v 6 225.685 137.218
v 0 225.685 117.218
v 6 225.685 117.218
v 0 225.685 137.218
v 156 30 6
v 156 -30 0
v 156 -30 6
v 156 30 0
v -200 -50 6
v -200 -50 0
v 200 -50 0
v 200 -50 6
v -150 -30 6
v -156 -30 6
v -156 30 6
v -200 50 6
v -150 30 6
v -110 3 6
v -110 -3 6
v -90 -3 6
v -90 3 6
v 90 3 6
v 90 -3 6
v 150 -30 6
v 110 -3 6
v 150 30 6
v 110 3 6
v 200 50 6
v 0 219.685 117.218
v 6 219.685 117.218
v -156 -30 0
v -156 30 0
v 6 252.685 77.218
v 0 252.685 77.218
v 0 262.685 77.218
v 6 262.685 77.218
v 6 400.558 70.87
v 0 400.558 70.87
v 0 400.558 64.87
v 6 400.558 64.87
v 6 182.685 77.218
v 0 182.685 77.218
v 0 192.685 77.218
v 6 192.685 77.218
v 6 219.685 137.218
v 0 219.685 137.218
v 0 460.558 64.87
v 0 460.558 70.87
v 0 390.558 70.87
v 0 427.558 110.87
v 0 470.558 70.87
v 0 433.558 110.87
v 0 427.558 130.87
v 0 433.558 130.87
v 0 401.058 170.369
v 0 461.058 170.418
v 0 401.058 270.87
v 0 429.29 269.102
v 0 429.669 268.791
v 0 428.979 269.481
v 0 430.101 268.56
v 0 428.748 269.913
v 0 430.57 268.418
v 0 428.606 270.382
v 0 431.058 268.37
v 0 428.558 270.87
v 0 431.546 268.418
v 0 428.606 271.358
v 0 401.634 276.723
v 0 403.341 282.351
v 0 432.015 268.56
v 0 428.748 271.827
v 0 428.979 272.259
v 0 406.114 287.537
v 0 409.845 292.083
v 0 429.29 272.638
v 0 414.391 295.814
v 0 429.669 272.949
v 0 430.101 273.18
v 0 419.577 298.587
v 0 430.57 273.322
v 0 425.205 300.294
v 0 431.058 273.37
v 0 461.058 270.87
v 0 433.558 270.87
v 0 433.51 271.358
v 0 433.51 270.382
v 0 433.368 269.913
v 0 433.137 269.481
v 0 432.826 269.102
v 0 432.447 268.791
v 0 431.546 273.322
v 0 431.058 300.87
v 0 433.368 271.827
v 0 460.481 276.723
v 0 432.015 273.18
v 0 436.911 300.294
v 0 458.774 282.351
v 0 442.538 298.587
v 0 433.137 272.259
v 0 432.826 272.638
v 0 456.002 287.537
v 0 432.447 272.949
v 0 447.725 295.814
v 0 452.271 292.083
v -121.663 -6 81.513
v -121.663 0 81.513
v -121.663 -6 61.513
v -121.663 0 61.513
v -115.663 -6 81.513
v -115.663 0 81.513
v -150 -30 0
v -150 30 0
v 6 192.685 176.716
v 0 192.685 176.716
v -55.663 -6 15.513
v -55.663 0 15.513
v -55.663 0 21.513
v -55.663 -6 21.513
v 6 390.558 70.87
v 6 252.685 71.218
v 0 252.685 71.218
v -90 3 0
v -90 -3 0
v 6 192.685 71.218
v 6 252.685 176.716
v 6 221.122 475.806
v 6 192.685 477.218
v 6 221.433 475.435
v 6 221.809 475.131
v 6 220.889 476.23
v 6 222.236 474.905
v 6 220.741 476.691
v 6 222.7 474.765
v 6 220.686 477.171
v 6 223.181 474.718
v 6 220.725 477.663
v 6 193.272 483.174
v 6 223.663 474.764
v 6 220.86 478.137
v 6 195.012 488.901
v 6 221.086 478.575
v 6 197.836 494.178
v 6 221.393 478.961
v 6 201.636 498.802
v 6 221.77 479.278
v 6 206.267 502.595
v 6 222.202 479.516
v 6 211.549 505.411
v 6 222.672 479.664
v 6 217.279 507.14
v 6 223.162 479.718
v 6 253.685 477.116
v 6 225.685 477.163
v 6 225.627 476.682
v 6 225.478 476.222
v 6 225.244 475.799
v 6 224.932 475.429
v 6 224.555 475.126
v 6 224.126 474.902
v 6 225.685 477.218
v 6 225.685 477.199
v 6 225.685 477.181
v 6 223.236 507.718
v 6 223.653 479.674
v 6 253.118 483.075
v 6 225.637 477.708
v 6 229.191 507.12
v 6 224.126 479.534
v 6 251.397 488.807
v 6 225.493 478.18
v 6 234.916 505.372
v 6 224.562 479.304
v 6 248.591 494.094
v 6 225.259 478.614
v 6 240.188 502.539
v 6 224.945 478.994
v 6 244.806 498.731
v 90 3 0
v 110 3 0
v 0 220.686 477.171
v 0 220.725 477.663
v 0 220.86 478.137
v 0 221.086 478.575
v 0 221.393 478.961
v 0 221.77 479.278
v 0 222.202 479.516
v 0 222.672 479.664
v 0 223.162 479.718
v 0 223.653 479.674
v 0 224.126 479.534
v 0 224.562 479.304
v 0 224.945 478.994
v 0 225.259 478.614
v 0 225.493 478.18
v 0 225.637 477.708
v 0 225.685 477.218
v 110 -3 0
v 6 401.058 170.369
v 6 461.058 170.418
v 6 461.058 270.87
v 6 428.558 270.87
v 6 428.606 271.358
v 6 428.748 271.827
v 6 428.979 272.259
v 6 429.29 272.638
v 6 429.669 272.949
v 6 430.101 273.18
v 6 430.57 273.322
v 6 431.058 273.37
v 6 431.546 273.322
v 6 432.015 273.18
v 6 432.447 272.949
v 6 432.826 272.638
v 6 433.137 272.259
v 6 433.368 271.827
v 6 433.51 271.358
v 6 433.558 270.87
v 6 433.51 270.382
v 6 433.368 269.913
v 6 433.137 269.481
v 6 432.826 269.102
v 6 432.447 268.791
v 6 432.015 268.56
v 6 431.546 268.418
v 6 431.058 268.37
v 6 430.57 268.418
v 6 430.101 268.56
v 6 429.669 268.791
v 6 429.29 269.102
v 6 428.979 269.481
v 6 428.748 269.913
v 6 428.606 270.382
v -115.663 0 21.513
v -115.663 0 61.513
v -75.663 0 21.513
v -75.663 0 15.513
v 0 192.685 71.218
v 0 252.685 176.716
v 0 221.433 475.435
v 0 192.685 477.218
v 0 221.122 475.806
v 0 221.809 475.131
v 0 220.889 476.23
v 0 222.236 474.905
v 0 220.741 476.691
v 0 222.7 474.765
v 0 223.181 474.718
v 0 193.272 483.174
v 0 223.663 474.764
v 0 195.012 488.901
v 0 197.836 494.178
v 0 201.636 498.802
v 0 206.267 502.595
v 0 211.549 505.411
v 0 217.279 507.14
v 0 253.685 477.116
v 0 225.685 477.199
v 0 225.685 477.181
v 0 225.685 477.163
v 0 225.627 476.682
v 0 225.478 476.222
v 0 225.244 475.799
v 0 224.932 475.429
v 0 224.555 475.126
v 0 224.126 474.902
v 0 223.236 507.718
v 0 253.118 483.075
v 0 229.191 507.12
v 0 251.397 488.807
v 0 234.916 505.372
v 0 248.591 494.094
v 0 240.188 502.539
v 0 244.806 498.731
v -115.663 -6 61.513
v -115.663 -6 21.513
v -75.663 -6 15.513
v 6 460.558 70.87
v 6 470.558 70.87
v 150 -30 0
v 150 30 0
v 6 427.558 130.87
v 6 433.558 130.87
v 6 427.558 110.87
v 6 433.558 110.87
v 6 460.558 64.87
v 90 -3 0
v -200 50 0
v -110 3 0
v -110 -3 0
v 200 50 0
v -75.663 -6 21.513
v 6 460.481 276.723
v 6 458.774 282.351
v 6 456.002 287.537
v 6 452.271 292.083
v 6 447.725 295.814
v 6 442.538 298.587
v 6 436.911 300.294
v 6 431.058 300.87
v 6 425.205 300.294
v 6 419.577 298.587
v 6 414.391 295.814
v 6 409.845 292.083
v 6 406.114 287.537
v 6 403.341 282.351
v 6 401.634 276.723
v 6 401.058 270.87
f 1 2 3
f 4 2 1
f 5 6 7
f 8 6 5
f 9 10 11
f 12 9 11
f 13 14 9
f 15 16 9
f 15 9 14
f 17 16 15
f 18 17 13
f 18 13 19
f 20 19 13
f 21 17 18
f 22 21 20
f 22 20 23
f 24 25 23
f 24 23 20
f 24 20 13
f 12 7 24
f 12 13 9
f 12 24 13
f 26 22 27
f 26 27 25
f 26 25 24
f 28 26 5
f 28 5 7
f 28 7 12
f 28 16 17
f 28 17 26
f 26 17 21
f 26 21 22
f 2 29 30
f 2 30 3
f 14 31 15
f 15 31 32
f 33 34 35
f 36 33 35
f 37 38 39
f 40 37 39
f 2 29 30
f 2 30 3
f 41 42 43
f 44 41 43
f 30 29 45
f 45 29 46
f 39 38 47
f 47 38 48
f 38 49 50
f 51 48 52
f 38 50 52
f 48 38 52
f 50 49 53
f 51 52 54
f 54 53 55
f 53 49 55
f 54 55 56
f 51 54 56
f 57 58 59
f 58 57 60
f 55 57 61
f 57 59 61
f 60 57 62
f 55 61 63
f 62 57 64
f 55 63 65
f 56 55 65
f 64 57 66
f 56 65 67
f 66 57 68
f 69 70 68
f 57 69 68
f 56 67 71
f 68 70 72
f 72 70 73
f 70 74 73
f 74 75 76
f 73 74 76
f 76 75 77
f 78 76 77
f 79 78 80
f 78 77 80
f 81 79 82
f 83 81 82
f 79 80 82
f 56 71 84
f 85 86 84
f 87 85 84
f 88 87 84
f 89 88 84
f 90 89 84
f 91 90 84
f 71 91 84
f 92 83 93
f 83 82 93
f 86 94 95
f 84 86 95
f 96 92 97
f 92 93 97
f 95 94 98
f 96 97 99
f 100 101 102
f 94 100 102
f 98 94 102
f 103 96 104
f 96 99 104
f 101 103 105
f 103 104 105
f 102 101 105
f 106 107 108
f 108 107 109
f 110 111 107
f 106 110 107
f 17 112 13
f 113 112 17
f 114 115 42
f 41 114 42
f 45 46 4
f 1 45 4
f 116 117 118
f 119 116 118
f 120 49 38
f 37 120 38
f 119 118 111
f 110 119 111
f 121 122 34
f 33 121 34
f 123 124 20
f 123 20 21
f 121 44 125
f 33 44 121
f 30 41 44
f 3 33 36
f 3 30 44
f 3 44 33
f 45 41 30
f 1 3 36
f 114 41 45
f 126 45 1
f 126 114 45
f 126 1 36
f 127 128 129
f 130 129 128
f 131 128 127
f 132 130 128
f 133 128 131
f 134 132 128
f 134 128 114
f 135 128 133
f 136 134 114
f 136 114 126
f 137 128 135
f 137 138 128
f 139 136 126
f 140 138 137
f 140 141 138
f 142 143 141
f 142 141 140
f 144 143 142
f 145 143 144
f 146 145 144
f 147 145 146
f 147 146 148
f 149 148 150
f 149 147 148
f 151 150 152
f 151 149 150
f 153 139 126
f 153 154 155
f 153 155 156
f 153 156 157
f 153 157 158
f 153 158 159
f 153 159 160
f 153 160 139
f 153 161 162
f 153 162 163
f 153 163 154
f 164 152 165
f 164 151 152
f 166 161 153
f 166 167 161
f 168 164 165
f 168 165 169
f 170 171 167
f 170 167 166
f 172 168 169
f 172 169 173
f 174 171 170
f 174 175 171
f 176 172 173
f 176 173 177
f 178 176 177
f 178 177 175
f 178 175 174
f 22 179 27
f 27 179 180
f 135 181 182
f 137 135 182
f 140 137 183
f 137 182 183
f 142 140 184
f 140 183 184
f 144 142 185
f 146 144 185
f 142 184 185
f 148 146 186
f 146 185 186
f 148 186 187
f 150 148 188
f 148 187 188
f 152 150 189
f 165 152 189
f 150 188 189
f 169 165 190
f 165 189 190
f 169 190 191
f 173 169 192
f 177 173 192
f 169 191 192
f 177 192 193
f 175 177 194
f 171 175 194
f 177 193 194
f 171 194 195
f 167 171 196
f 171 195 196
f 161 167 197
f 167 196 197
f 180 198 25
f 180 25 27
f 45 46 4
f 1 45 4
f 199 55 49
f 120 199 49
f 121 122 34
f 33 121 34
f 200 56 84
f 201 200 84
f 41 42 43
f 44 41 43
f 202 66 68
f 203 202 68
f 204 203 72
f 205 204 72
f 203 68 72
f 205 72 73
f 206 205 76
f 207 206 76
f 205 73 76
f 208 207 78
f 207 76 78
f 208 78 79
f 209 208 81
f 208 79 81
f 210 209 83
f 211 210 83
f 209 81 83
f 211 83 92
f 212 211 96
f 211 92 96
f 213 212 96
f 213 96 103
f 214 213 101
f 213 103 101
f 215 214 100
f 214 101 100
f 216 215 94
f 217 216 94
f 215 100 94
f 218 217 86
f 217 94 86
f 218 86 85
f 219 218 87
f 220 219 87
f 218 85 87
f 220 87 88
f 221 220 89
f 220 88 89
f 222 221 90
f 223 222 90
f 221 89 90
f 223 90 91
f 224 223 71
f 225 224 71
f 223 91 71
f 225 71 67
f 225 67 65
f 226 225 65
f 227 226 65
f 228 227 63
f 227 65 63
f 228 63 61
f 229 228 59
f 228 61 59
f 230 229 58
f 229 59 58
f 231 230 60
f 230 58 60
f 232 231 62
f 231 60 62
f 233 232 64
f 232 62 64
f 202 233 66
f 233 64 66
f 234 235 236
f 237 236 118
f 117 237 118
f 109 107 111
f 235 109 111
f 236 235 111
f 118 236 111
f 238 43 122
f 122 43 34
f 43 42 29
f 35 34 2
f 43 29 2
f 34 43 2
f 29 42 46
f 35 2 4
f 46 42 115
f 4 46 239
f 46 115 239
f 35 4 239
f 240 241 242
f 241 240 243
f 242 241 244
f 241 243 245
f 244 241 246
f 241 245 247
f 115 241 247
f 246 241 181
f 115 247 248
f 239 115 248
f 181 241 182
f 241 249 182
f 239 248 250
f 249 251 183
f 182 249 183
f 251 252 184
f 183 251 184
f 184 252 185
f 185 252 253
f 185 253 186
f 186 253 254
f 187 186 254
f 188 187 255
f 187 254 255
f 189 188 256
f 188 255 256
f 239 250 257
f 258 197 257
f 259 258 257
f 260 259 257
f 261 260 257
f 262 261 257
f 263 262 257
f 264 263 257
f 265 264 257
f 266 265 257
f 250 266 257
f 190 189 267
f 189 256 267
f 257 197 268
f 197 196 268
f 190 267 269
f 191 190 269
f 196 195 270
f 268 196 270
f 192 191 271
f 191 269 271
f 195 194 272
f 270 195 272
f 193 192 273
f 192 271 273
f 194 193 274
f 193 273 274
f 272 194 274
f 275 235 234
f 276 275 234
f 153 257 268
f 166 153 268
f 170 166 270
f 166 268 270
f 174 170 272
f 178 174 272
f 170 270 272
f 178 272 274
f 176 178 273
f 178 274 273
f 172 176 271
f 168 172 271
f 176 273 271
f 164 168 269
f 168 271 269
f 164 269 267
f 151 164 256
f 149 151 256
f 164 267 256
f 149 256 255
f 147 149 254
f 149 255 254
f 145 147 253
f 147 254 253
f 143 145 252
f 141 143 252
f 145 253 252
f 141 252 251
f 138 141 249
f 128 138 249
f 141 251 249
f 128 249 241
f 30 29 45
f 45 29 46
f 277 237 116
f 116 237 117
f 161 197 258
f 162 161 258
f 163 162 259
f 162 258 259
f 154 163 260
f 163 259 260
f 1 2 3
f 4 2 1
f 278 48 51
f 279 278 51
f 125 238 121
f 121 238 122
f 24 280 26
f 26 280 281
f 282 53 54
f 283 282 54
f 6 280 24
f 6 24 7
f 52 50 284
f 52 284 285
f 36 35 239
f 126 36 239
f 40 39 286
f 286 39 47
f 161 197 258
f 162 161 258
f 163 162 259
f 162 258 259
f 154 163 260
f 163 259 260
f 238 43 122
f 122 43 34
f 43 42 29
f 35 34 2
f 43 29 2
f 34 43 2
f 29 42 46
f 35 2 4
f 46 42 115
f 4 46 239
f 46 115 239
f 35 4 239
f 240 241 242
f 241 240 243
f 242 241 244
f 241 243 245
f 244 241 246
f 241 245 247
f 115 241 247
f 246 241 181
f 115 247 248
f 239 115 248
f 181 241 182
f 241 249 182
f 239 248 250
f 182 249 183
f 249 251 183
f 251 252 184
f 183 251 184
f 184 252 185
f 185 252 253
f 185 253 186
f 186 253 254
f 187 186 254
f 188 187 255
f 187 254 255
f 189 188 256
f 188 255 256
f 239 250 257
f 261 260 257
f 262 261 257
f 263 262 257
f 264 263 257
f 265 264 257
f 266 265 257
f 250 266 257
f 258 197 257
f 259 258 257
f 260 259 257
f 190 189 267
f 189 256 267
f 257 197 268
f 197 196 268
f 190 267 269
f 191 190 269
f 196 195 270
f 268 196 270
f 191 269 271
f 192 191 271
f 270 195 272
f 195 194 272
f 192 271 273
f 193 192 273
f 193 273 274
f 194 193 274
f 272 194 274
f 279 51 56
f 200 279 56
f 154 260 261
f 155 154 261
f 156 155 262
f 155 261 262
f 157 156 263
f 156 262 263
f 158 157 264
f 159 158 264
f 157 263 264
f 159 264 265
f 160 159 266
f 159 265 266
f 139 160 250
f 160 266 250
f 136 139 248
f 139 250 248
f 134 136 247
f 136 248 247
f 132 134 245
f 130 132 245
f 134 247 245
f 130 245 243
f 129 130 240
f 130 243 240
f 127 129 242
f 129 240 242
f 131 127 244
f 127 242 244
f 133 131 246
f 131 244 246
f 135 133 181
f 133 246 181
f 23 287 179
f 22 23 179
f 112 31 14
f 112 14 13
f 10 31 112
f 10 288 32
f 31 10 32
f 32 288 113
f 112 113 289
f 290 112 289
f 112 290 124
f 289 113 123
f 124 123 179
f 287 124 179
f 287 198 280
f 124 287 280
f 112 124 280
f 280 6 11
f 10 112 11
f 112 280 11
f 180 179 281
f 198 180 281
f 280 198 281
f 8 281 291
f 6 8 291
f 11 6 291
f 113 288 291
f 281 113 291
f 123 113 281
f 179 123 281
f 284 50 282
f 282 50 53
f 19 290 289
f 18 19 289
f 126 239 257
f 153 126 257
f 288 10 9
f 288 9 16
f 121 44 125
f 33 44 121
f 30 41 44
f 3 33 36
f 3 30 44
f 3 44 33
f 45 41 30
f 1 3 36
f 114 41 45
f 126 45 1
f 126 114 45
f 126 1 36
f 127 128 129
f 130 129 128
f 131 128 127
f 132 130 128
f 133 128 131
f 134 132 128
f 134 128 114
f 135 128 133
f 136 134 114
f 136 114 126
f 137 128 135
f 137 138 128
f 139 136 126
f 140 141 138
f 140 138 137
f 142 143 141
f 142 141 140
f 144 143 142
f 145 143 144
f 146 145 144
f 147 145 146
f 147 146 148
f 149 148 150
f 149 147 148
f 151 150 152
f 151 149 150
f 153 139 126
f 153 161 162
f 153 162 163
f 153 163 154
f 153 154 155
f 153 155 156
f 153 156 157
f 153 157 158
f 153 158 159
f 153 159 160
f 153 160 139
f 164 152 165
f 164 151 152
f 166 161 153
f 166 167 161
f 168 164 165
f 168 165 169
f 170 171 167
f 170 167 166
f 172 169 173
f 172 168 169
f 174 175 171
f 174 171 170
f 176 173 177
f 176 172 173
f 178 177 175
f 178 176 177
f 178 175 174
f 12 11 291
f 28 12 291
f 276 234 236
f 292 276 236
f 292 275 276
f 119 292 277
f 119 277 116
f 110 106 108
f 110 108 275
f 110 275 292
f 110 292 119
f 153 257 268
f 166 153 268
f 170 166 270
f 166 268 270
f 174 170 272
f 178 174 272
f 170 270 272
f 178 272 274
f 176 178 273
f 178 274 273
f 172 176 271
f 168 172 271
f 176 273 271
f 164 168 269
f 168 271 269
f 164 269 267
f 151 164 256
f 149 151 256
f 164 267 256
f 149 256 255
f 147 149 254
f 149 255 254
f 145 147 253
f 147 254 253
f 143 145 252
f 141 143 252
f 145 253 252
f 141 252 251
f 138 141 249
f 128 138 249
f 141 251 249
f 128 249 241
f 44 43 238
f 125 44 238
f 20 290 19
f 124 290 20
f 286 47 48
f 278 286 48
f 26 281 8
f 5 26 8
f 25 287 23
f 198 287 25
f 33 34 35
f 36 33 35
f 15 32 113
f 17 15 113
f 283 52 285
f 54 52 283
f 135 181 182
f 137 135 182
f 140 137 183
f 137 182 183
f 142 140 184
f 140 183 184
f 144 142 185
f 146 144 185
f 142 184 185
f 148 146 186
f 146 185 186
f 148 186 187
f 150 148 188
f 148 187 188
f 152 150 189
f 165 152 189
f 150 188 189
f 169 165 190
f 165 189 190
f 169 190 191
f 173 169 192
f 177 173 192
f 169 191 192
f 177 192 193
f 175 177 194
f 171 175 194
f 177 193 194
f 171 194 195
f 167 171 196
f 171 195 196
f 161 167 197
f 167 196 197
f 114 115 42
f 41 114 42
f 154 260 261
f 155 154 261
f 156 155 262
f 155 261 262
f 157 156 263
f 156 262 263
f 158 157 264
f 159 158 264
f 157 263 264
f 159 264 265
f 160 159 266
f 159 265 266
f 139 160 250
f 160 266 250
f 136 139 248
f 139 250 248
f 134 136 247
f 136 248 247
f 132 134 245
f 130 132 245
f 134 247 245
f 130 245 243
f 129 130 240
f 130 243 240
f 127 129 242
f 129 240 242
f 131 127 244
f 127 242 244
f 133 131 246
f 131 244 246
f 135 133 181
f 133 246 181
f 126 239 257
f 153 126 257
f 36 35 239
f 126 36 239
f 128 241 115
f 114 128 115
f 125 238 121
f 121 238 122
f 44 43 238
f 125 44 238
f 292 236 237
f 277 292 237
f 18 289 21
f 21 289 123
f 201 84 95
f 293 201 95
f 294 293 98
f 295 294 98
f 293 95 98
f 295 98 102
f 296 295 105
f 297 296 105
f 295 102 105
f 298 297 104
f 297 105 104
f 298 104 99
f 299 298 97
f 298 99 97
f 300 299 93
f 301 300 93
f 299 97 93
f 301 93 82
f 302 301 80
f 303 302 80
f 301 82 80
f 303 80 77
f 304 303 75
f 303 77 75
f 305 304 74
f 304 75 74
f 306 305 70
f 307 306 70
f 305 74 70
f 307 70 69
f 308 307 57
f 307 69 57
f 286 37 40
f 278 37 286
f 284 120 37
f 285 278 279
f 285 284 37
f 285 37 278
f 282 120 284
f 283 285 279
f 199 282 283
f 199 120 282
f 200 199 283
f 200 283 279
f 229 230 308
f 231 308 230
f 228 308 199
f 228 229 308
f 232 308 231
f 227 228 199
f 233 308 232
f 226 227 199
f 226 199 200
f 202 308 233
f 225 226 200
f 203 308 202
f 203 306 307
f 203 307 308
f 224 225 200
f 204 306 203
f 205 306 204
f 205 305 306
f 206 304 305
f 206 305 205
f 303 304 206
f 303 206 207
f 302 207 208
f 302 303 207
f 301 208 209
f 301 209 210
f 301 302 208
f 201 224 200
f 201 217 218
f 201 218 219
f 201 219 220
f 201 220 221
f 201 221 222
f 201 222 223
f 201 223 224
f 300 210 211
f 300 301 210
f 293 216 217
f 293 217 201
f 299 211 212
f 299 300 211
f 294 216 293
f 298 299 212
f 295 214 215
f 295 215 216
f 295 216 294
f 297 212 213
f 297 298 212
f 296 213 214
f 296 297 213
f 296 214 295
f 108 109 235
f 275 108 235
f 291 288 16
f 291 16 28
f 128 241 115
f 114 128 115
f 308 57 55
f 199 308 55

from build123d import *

# Parameters (mm, degrees)
F0_W     = 400
F0_H     = 100
F0_W_2   = 6
F0_H_2   = 60
F0_W_3   = 20
F0_H_3   = 6
F1_DEPTH = 6
F3_DEPTH = 6
F4_W     = 6
F4_H     = 20
F5_DEPTH = 6
F6_DEPTH = 6


with BuildPart() as f1:
    # F0 (on Top) → F1 (new body)
    with BuildSketch(Plane.XY):
        Rectangle(F0_W, F0_H)
        with Locations((-153, 0)):
            Rectangle(F0_W_2, F0_H_2, mode=Mode.SUBTRACT)
        with Locations((-100, 0)):
            Rectangle(F0_W_3, F0_H_3, mode=Mode.SUBTRACT)
        with Locations((100, 0)):
            Rectangle(F0_W_3, F0_H_3, mode=Mode.SUBTRACT)
        with Locations((153, 0)):
            Rectangle(F0_W_2, F0_H_2, mode=Mode.SUBTRACT)
    extrude(amount=F1_DEPTH)


with BuildPart() as f3:
    # F2 (on Front) → F3 (new body)
    with BuildSketch(Plane.XZ):
        Polygon((-55.662855, 21.512951), (-115.662855, 81.512951), (-121.662855, 81.512951), (-121.662855, 61.512951), (-115.662855, 61.512951), (-115.662855, 21.512951), (-75.662855, 21.512951), (-75.662855, 15.512951), (-55.662855, 15.512951), align=None)
    extrude(amount=F3_DEPTH)


with BuildPart() as f5:
    # F4 (on Right) → F5 (new body)
    with BuildSketch(Plane.YZ):
        with BuildLine():
            Line((225.6846, 477.162799), (253.685034, 477.116201))
            ThreePointArc((253.685034, 477.116201), (223.23596, 507.717673), (192.685203, 477.217715))
            Line((192.685203, 477.217715), (220.685637, 477.171118))
            ThreePointArc((220.685637, 477.171118), (223.161903, 479.717606), (225.685203, 477.217715))
            ThreePointArc((225.685203, 477.217715), (225.685052, 477.190255), (225.6846, 477.162799))
        make_face()
        with BuildLine():
            Line((252.685203, 176.716459), (253.685034, 477.116201))
            Line((253.685034, 477.116201), (225.6846, 477.162799))
            ThreePointArc((225.6846, 477.162799), (223.181043, 474.717718), (220.685637, 477.171118))
            Line((220.685637, 477.171118), (192.685203, 477.217715))
            Line((192.685203, 477.217715), (192.685203, 176.716459))
            Line((192.685203, 176.716459), (182.685203, 77.217715))
            Line((182.685203, 77.217715), (192.685203, 77.217715))
            Line((192.685203, 77.217715), (192.685203, 71.217715))
            Line((192.685203, 71.217715), (252.685203, 71.217715))
            Line((252.685203, 71.217715), (252.685203, 77.217715))
            Line((252.685203, 77.217715), (262.685203, 77.217715))
            Line((262.685203, 77.217715), (252.685203, 176.716459))
        make_face()
        with Locations((222.685203, 127.217715)):
            Rectangle(F4_W, F4_H, mode=Mode.SUBTRACT)
    extrude(amount=F5_DEPTH)


with BuildPart() as f6:
    # F4 (on Right) → F6 (new body)
    with BuildSketch(Plane.YZ):
        with BuildLine():
            Line((252.685203, 176.716459), (253.685034, 477.116201))
            Line((253.685034, 477.116201), (225.6846, 477.162799))
            ThreePointArc((225.6846, 477.162799), (223.181043, 474.717718), (220.685637, 477.171118))
            Line((220.685637, 477.171118), (192.685203, 477.217715))
            Line((192.685203, 477.217715), (192.685203, 176.716459))
            Line((192.685203, 176.716459), (182.685203, 77.217715))
            Line((182.685203, 77.217715), (192.685203, 77.217715))
            Line((192.685203, 77.217715), (192.685203, 71.217715))
            Line((192.685203, 71.217715), (252.685203, 71.217715))
            Line((252.685203, 71.217715), (252.685203, 77.217715))
            Line((252.685203, 77.217715), (262.685203, 77.217715))
            Line((262.685203, 77.217715), (252.685203, 176.716459))
        make_face()
        with Locations((222.685203, 127.217715)):
            Rectangle(F4_W, F4_H, mode=Mode.SUBTRACT)
        with BuildLine():
            Line((225.6846, 477.162799), (253.685034, 477.116201))
            ThreePointArc((253.685034, 477.116201), (223.23596, 507.717673), (192.685203, 477.217715))
            Line((192.685203, 477.217715), (220.685637, 477.171118))
            ThreePointArc((220.685637, 477.171118), (223.161903, 479.717606), (225.685203, 477.217715))
            ThreePointArc((225.685203, 477.217715), (225.685052, 477.190255), (225.6846, 477.162799))
        make_face()
        with BuildLine():
            Line((460.557847, 64.870163), (460.557847, 70.870163))
            Line((460.557847, 70.870163), (470.557847, 70.870163))
            Line((470.557847, 70.870163), (461.057847, 170.41789))
            Line((461.057847, 170.41789), (461.057847, 270.870167))
            Line((461.057847, 270.870167), (433.557847, 270.870167))
            ThreePointArc((433.557847, 270.870167), (431.057847, 268.370167), (428.557847, 270.870167))
            Line((428.557847, 270.870167), (401.057847, 270.870167))
            Line((401.057847, 270.870167), (401.057847, 170.368907))
            Line((401.057847, 170.368907), (390.557847, 70.870163))
            Line((390.557847, 70.870163), (400.557847, 70.870163))
            Line((400.557847, 70.870163), (400.557847, 64.870163))
            Line((400.557847, 64.870163), (460.557847, 64.870163))
        make_face()
        with Locations((430.557847, 120.870163)):
            Rectangle(F4_W, F4_H, mode=Mode.SUBTRACT)
        with BuildLine():
            Line((433.557847, 270.870167), (461.057847, 270.870167))
            ThreePointArc((461.057847, 270.870167), (431.057847, 300.870167), (401.057847, 270.870167))
            Line((401.057847, 270.870167), (428.557847, 270.870167))
            ThreePointArc((428.557847, 270.870167), (431.057847, 273.370167), (433.557847, 270.870167))
        make_face()
    extrude(amount=F6_DEPTH)


solid = Compound([f1.part, f3.part, f5.part, f6.part])
